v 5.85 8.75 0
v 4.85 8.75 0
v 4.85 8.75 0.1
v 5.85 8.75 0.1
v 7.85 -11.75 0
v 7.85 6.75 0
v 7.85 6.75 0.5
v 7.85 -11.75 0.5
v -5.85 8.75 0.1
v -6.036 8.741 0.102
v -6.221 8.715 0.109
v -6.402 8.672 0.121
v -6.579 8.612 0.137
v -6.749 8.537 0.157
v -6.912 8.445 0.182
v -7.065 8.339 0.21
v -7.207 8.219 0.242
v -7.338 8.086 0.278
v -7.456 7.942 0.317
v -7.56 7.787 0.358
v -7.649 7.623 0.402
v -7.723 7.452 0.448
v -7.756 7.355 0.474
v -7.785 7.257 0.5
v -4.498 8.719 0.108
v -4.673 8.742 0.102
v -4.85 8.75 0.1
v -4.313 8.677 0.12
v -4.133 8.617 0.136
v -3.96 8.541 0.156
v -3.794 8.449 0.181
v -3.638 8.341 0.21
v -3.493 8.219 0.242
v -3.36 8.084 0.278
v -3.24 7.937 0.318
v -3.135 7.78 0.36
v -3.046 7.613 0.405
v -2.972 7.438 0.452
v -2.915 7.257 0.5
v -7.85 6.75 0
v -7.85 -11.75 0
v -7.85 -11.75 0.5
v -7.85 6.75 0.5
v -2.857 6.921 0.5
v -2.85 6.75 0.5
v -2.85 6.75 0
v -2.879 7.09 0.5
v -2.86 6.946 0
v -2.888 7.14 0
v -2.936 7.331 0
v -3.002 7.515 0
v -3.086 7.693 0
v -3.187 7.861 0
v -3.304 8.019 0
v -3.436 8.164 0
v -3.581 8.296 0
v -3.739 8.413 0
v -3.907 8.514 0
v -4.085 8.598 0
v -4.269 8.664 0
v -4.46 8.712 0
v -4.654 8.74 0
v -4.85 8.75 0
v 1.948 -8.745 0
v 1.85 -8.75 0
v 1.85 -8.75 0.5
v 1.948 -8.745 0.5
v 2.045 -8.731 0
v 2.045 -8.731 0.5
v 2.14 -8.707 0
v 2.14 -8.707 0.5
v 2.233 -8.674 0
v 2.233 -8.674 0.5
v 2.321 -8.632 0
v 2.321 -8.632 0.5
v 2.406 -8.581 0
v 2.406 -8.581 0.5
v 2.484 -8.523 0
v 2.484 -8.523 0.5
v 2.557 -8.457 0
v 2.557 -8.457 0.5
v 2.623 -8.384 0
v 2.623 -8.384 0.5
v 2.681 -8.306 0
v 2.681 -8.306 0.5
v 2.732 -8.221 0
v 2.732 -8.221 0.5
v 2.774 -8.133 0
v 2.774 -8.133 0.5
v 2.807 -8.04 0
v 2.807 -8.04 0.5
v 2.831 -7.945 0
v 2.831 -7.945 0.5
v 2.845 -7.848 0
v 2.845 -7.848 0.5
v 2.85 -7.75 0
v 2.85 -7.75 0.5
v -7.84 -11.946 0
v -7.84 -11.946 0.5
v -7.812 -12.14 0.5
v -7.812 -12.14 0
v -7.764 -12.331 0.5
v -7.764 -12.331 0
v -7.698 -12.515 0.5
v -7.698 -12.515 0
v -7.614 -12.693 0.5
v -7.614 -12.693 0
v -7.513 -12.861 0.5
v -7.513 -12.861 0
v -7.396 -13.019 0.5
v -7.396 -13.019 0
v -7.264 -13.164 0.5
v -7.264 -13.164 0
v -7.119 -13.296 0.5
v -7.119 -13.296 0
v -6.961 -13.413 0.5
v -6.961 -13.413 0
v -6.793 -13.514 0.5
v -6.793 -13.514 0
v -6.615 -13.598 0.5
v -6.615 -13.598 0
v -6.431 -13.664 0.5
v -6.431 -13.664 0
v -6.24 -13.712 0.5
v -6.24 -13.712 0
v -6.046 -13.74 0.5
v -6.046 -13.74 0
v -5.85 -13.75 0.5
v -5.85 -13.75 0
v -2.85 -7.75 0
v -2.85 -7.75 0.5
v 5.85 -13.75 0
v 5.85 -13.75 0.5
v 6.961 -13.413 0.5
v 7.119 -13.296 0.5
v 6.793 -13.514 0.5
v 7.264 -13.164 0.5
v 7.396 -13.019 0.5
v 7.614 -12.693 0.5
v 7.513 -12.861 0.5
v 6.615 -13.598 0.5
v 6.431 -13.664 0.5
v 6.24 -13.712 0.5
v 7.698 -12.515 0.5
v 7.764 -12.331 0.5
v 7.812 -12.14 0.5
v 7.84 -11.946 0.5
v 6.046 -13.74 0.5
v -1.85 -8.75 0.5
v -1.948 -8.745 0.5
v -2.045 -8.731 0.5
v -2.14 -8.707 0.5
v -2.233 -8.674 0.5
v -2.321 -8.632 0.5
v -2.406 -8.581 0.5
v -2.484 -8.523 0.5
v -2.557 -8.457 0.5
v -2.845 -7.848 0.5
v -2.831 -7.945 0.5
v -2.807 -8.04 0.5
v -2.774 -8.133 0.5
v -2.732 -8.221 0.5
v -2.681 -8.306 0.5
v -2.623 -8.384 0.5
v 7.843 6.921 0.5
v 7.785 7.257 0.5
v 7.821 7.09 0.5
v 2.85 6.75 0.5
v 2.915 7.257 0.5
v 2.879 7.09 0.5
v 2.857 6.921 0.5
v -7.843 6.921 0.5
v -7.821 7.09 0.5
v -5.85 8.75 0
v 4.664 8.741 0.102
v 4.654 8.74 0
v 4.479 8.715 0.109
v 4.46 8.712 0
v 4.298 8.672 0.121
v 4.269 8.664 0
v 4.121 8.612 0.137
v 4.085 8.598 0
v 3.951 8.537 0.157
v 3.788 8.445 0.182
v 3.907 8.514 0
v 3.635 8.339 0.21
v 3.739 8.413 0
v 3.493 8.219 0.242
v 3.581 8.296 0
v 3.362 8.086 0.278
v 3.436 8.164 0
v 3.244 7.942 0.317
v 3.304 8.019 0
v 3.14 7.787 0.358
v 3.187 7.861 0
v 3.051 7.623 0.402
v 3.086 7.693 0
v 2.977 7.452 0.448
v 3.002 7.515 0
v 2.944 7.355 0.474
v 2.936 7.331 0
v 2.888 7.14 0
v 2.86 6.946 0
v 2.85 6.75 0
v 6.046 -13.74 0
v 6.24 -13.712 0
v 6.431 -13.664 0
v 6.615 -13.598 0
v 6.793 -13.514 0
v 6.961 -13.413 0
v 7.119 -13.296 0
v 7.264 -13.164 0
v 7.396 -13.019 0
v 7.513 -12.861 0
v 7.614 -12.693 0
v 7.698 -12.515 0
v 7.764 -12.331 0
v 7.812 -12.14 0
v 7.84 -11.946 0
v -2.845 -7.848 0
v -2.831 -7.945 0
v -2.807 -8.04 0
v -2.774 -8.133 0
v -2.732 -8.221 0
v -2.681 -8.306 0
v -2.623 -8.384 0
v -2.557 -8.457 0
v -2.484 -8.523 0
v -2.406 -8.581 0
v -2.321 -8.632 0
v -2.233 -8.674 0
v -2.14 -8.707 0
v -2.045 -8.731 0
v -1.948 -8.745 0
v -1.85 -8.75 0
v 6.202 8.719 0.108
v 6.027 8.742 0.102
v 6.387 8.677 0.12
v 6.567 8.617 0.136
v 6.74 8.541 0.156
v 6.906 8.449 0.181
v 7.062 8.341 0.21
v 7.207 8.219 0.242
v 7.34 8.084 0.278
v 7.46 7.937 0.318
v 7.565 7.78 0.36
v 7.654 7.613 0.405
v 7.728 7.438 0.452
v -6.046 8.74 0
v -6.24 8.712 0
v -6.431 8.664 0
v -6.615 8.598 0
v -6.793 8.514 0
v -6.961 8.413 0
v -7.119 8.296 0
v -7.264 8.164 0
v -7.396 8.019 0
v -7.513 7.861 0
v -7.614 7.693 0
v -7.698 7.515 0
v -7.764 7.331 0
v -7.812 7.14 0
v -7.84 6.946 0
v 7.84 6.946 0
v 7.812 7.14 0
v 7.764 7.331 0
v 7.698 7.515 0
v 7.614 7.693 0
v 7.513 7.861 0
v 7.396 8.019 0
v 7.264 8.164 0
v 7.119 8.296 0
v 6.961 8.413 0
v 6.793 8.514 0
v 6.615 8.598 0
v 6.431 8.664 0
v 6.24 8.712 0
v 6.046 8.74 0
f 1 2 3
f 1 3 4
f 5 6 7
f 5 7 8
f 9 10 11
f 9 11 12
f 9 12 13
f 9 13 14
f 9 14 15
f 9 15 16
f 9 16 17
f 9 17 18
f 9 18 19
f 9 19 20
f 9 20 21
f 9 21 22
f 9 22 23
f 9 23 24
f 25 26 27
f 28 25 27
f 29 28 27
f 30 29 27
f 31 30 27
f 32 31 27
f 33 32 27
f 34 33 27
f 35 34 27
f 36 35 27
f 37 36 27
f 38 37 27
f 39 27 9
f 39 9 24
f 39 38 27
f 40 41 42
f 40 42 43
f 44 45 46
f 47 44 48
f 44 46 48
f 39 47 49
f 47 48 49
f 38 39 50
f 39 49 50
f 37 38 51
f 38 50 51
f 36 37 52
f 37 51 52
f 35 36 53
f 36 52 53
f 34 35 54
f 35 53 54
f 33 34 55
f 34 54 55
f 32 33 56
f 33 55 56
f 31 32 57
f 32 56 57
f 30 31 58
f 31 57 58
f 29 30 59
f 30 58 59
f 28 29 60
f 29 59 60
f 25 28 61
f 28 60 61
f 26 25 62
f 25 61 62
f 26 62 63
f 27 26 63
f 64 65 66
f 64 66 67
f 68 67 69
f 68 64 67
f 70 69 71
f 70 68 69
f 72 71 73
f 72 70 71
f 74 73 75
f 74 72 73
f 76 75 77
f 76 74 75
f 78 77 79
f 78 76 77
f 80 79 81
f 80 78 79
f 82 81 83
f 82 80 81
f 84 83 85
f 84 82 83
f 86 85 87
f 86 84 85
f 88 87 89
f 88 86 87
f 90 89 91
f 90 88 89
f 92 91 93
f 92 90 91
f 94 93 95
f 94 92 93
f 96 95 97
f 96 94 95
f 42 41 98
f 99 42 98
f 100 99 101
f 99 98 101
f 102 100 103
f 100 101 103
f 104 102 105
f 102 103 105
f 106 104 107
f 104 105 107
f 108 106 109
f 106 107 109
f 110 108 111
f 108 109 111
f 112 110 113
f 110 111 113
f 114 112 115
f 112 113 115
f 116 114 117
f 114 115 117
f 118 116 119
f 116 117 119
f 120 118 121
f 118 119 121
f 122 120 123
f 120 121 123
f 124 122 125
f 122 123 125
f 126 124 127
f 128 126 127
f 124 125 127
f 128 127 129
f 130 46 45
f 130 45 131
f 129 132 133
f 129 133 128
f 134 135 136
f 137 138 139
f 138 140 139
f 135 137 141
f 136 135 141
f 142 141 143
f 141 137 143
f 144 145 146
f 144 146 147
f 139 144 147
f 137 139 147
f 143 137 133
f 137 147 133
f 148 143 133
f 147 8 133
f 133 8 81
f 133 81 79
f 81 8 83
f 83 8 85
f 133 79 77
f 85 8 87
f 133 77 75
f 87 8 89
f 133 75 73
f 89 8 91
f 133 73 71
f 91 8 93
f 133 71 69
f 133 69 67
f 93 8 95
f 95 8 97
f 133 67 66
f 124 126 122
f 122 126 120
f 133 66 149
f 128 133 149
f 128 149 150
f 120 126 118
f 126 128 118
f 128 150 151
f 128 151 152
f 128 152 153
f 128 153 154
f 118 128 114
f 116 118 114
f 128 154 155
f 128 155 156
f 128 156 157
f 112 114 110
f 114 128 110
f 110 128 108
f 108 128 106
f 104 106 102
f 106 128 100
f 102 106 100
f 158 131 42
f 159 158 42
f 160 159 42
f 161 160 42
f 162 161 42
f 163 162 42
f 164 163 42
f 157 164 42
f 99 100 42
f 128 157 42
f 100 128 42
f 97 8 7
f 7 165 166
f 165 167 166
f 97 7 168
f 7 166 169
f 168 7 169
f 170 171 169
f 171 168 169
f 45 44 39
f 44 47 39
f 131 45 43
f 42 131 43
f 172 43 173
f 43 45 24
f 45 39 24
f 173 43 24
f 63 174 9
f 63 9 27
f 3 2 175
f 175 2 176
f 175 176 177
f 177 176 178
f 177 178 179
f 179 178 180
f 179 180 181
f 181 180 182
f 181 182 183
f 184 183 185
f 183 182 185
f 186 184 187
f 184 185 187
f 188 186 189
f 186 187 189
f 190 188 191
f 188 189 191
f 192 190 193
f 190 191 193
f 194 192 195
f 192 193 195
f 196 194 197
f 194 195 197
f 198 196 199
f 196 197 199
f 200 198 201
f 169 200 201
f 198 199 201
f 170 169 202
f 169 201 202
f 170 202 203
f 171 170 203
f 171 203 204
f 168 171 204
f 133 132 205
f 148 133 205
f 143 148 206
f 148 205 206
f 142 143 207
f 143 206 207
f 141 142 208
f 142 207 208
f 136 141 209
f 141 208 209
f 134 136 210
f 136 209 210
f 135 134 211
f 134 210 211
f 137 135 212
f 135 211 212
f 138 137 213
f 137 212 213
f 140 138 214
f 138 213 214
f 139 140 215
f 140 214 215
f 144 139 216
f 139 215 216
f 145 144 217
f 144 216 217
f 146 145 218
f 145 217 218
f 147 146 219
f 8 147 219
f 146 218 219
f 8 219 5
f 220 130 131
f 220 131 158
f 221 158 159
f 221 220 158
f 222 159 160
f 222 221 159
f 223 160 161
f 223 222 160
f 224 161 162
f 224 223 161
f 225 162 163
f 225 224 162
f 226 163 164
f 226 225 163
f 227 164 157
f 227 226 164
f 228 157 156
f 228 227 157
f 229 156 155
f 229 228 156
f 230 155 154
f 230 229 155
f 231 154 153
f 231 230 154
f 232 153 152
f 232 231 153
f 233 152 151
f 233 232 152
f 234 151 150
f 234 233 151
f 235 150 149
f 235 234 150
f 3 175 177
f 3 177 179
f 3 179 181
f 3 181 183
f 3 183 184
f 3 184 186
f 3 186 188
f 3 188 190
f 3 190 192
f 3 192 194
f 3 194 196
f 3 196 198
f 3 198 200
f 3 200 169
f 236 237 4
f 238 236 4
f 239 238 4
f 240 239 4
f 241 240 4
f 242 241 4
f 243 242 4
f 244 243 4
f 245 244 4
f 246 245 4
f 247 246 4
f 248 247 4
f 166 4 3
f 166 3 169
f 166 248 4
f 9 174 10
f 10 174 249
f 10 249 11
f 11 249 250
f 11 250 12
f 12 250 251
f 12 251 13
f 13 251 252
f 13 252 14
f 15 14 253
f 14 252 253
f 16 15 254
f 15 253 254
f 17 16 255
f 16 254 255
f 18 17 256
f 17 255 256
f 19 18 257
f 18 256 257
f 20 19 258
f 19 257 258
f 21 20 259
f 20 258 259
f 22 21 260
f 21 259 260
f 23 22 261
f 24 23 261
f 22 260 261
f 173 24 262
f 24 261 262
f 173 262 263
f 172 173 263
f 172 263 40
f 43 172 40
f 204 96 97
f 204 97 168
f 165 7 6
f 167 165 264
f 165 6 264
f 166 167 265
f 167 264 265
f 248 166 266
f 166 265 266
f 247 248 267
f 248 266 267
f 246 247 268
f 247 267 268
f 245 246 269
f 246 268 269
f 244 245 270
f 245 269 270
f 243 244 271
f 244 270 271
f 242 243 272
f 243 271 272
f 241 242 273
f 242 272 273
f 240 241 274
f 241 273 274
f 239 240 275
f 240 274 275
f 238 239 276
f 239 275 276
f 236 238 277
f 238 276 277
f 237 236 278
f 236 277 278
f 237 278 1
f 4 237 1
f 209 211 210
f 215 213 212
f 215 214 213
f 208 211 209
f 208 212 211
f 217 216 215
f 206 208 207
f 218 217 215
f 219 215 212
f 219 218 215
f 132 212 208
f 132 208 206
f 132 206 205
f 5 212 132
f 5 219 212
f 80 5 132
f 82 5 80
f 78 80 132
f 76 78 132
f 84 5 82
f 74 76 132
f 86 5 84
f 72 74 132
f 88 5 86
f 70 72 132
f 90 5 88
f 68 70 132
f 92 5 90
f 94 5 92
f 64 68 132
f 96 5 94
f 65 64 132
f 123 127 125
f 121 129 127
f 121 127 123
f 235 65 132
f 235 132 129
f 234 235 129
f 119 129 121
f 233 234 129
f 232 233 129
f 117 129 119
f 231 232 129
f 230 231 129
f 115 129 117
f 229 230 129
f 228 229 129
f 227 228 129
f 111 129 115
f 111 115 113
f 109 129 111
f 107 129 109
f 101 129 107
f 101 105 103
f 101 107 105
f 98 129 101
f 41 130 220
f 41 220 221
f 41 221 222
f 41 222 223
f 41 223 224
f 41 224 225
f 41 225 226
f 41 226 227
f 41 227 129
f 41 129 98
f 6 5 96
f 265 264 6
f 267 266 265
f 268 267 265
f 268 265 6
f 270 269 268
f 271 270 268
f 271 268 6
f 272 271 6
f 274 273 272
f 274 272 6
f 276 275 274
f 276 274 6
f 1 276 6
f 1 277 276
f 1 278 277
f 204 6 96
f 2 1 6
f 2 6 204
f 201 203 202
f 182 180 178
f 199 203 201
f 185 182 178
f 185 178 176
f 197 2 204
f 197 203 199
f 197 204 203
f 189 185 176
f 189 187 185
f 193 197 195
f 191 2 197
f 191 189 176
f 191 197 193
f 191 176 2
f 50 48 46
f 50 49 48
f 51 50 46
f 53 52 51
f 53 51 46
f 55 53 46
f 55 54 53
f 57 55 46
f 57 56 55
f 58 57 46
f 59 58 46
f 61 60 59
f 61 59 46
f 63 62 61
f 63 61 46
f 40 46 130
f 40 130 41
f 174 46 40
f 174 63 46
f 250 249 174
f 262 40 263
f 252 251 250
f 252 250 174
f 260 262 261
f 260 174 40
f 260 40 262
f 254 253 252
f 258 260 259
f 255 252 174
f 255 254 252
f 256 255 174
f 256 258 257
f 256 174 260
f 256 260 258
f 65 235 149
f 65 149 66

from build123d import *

# Parameters (mm, degrees)
EXTRUDE001_DEPTH = 20
EXTRUDE_DEPTH    = 0.5


with BuildPart() as extrude001:
    # Sketch001 → Extrude001 (new body, symmetric)
    with BuildSketch(Plane.YZ):
        Polygon((8.75, 0.1), (6.329819, 0.748485), (8.75, 0.748485), align=None)
    extrude(amount=EXTRUDE001_DEPTH, both=True)


with BuildPart() as cut:
    # Sketch → Extrude (new body)
    with BuildSketch(Plane.XY):
        with BuildLine():
            Line((-2.85, 6.75), (-2.85, -7.75))
            ThreePointArc((-2.85, -7.75), (-2.557107, -8.457107), (-1.85, -8.75))
            Line((-1.85, -8.75), (1.85, -8.75))
            ThreePointArc((1.85, -8.75), (2.557107, -8.457107), (2.85, -7.75))
            Line((2.85, -7.75), (2.85, 6.75))
            ThreePointArc((4.85, 8.75), (3.435786, 8.164214), (2.85, 6.75))
            Line((4.85, 8.75), (5.85, 8.75))
            ThreePointArc((7.85, 6.75), (7.264214, 8.164214), (5.85, 8.75))
            Line((7.85, 6.75), (7.85, -11.75))
            ThreePointArc((5.85, -13.75), (7.264214, -13.164214), (7.85, -11.75))
            Line((5.85, -13.75), (-5.85, -13.75))
            ThreePointArc((-7.85, -11.75), (-7.264214, -13.164214), (-5.85, -13.75))
            Line((-7.85, -11.75), (-7.85, 6.75))
            ThreePointArc((-5.85, 8.75), (-7.264214, 8.164214), (-7.85, 6.75))
            Line((-5.85, 8.75), (-4.85, 8.75))
            ThreePointArc((-2.85, 6.75), (-3.435786, 8.164214), (-4.85, 8.75))
        make_face()
    extrude(amount=EXTRUDE_DEPTH)

    # Cut: cut Extrude001
    add(extrude001.part, mode=Mode.SUBTRACT)


solid = cut.part
